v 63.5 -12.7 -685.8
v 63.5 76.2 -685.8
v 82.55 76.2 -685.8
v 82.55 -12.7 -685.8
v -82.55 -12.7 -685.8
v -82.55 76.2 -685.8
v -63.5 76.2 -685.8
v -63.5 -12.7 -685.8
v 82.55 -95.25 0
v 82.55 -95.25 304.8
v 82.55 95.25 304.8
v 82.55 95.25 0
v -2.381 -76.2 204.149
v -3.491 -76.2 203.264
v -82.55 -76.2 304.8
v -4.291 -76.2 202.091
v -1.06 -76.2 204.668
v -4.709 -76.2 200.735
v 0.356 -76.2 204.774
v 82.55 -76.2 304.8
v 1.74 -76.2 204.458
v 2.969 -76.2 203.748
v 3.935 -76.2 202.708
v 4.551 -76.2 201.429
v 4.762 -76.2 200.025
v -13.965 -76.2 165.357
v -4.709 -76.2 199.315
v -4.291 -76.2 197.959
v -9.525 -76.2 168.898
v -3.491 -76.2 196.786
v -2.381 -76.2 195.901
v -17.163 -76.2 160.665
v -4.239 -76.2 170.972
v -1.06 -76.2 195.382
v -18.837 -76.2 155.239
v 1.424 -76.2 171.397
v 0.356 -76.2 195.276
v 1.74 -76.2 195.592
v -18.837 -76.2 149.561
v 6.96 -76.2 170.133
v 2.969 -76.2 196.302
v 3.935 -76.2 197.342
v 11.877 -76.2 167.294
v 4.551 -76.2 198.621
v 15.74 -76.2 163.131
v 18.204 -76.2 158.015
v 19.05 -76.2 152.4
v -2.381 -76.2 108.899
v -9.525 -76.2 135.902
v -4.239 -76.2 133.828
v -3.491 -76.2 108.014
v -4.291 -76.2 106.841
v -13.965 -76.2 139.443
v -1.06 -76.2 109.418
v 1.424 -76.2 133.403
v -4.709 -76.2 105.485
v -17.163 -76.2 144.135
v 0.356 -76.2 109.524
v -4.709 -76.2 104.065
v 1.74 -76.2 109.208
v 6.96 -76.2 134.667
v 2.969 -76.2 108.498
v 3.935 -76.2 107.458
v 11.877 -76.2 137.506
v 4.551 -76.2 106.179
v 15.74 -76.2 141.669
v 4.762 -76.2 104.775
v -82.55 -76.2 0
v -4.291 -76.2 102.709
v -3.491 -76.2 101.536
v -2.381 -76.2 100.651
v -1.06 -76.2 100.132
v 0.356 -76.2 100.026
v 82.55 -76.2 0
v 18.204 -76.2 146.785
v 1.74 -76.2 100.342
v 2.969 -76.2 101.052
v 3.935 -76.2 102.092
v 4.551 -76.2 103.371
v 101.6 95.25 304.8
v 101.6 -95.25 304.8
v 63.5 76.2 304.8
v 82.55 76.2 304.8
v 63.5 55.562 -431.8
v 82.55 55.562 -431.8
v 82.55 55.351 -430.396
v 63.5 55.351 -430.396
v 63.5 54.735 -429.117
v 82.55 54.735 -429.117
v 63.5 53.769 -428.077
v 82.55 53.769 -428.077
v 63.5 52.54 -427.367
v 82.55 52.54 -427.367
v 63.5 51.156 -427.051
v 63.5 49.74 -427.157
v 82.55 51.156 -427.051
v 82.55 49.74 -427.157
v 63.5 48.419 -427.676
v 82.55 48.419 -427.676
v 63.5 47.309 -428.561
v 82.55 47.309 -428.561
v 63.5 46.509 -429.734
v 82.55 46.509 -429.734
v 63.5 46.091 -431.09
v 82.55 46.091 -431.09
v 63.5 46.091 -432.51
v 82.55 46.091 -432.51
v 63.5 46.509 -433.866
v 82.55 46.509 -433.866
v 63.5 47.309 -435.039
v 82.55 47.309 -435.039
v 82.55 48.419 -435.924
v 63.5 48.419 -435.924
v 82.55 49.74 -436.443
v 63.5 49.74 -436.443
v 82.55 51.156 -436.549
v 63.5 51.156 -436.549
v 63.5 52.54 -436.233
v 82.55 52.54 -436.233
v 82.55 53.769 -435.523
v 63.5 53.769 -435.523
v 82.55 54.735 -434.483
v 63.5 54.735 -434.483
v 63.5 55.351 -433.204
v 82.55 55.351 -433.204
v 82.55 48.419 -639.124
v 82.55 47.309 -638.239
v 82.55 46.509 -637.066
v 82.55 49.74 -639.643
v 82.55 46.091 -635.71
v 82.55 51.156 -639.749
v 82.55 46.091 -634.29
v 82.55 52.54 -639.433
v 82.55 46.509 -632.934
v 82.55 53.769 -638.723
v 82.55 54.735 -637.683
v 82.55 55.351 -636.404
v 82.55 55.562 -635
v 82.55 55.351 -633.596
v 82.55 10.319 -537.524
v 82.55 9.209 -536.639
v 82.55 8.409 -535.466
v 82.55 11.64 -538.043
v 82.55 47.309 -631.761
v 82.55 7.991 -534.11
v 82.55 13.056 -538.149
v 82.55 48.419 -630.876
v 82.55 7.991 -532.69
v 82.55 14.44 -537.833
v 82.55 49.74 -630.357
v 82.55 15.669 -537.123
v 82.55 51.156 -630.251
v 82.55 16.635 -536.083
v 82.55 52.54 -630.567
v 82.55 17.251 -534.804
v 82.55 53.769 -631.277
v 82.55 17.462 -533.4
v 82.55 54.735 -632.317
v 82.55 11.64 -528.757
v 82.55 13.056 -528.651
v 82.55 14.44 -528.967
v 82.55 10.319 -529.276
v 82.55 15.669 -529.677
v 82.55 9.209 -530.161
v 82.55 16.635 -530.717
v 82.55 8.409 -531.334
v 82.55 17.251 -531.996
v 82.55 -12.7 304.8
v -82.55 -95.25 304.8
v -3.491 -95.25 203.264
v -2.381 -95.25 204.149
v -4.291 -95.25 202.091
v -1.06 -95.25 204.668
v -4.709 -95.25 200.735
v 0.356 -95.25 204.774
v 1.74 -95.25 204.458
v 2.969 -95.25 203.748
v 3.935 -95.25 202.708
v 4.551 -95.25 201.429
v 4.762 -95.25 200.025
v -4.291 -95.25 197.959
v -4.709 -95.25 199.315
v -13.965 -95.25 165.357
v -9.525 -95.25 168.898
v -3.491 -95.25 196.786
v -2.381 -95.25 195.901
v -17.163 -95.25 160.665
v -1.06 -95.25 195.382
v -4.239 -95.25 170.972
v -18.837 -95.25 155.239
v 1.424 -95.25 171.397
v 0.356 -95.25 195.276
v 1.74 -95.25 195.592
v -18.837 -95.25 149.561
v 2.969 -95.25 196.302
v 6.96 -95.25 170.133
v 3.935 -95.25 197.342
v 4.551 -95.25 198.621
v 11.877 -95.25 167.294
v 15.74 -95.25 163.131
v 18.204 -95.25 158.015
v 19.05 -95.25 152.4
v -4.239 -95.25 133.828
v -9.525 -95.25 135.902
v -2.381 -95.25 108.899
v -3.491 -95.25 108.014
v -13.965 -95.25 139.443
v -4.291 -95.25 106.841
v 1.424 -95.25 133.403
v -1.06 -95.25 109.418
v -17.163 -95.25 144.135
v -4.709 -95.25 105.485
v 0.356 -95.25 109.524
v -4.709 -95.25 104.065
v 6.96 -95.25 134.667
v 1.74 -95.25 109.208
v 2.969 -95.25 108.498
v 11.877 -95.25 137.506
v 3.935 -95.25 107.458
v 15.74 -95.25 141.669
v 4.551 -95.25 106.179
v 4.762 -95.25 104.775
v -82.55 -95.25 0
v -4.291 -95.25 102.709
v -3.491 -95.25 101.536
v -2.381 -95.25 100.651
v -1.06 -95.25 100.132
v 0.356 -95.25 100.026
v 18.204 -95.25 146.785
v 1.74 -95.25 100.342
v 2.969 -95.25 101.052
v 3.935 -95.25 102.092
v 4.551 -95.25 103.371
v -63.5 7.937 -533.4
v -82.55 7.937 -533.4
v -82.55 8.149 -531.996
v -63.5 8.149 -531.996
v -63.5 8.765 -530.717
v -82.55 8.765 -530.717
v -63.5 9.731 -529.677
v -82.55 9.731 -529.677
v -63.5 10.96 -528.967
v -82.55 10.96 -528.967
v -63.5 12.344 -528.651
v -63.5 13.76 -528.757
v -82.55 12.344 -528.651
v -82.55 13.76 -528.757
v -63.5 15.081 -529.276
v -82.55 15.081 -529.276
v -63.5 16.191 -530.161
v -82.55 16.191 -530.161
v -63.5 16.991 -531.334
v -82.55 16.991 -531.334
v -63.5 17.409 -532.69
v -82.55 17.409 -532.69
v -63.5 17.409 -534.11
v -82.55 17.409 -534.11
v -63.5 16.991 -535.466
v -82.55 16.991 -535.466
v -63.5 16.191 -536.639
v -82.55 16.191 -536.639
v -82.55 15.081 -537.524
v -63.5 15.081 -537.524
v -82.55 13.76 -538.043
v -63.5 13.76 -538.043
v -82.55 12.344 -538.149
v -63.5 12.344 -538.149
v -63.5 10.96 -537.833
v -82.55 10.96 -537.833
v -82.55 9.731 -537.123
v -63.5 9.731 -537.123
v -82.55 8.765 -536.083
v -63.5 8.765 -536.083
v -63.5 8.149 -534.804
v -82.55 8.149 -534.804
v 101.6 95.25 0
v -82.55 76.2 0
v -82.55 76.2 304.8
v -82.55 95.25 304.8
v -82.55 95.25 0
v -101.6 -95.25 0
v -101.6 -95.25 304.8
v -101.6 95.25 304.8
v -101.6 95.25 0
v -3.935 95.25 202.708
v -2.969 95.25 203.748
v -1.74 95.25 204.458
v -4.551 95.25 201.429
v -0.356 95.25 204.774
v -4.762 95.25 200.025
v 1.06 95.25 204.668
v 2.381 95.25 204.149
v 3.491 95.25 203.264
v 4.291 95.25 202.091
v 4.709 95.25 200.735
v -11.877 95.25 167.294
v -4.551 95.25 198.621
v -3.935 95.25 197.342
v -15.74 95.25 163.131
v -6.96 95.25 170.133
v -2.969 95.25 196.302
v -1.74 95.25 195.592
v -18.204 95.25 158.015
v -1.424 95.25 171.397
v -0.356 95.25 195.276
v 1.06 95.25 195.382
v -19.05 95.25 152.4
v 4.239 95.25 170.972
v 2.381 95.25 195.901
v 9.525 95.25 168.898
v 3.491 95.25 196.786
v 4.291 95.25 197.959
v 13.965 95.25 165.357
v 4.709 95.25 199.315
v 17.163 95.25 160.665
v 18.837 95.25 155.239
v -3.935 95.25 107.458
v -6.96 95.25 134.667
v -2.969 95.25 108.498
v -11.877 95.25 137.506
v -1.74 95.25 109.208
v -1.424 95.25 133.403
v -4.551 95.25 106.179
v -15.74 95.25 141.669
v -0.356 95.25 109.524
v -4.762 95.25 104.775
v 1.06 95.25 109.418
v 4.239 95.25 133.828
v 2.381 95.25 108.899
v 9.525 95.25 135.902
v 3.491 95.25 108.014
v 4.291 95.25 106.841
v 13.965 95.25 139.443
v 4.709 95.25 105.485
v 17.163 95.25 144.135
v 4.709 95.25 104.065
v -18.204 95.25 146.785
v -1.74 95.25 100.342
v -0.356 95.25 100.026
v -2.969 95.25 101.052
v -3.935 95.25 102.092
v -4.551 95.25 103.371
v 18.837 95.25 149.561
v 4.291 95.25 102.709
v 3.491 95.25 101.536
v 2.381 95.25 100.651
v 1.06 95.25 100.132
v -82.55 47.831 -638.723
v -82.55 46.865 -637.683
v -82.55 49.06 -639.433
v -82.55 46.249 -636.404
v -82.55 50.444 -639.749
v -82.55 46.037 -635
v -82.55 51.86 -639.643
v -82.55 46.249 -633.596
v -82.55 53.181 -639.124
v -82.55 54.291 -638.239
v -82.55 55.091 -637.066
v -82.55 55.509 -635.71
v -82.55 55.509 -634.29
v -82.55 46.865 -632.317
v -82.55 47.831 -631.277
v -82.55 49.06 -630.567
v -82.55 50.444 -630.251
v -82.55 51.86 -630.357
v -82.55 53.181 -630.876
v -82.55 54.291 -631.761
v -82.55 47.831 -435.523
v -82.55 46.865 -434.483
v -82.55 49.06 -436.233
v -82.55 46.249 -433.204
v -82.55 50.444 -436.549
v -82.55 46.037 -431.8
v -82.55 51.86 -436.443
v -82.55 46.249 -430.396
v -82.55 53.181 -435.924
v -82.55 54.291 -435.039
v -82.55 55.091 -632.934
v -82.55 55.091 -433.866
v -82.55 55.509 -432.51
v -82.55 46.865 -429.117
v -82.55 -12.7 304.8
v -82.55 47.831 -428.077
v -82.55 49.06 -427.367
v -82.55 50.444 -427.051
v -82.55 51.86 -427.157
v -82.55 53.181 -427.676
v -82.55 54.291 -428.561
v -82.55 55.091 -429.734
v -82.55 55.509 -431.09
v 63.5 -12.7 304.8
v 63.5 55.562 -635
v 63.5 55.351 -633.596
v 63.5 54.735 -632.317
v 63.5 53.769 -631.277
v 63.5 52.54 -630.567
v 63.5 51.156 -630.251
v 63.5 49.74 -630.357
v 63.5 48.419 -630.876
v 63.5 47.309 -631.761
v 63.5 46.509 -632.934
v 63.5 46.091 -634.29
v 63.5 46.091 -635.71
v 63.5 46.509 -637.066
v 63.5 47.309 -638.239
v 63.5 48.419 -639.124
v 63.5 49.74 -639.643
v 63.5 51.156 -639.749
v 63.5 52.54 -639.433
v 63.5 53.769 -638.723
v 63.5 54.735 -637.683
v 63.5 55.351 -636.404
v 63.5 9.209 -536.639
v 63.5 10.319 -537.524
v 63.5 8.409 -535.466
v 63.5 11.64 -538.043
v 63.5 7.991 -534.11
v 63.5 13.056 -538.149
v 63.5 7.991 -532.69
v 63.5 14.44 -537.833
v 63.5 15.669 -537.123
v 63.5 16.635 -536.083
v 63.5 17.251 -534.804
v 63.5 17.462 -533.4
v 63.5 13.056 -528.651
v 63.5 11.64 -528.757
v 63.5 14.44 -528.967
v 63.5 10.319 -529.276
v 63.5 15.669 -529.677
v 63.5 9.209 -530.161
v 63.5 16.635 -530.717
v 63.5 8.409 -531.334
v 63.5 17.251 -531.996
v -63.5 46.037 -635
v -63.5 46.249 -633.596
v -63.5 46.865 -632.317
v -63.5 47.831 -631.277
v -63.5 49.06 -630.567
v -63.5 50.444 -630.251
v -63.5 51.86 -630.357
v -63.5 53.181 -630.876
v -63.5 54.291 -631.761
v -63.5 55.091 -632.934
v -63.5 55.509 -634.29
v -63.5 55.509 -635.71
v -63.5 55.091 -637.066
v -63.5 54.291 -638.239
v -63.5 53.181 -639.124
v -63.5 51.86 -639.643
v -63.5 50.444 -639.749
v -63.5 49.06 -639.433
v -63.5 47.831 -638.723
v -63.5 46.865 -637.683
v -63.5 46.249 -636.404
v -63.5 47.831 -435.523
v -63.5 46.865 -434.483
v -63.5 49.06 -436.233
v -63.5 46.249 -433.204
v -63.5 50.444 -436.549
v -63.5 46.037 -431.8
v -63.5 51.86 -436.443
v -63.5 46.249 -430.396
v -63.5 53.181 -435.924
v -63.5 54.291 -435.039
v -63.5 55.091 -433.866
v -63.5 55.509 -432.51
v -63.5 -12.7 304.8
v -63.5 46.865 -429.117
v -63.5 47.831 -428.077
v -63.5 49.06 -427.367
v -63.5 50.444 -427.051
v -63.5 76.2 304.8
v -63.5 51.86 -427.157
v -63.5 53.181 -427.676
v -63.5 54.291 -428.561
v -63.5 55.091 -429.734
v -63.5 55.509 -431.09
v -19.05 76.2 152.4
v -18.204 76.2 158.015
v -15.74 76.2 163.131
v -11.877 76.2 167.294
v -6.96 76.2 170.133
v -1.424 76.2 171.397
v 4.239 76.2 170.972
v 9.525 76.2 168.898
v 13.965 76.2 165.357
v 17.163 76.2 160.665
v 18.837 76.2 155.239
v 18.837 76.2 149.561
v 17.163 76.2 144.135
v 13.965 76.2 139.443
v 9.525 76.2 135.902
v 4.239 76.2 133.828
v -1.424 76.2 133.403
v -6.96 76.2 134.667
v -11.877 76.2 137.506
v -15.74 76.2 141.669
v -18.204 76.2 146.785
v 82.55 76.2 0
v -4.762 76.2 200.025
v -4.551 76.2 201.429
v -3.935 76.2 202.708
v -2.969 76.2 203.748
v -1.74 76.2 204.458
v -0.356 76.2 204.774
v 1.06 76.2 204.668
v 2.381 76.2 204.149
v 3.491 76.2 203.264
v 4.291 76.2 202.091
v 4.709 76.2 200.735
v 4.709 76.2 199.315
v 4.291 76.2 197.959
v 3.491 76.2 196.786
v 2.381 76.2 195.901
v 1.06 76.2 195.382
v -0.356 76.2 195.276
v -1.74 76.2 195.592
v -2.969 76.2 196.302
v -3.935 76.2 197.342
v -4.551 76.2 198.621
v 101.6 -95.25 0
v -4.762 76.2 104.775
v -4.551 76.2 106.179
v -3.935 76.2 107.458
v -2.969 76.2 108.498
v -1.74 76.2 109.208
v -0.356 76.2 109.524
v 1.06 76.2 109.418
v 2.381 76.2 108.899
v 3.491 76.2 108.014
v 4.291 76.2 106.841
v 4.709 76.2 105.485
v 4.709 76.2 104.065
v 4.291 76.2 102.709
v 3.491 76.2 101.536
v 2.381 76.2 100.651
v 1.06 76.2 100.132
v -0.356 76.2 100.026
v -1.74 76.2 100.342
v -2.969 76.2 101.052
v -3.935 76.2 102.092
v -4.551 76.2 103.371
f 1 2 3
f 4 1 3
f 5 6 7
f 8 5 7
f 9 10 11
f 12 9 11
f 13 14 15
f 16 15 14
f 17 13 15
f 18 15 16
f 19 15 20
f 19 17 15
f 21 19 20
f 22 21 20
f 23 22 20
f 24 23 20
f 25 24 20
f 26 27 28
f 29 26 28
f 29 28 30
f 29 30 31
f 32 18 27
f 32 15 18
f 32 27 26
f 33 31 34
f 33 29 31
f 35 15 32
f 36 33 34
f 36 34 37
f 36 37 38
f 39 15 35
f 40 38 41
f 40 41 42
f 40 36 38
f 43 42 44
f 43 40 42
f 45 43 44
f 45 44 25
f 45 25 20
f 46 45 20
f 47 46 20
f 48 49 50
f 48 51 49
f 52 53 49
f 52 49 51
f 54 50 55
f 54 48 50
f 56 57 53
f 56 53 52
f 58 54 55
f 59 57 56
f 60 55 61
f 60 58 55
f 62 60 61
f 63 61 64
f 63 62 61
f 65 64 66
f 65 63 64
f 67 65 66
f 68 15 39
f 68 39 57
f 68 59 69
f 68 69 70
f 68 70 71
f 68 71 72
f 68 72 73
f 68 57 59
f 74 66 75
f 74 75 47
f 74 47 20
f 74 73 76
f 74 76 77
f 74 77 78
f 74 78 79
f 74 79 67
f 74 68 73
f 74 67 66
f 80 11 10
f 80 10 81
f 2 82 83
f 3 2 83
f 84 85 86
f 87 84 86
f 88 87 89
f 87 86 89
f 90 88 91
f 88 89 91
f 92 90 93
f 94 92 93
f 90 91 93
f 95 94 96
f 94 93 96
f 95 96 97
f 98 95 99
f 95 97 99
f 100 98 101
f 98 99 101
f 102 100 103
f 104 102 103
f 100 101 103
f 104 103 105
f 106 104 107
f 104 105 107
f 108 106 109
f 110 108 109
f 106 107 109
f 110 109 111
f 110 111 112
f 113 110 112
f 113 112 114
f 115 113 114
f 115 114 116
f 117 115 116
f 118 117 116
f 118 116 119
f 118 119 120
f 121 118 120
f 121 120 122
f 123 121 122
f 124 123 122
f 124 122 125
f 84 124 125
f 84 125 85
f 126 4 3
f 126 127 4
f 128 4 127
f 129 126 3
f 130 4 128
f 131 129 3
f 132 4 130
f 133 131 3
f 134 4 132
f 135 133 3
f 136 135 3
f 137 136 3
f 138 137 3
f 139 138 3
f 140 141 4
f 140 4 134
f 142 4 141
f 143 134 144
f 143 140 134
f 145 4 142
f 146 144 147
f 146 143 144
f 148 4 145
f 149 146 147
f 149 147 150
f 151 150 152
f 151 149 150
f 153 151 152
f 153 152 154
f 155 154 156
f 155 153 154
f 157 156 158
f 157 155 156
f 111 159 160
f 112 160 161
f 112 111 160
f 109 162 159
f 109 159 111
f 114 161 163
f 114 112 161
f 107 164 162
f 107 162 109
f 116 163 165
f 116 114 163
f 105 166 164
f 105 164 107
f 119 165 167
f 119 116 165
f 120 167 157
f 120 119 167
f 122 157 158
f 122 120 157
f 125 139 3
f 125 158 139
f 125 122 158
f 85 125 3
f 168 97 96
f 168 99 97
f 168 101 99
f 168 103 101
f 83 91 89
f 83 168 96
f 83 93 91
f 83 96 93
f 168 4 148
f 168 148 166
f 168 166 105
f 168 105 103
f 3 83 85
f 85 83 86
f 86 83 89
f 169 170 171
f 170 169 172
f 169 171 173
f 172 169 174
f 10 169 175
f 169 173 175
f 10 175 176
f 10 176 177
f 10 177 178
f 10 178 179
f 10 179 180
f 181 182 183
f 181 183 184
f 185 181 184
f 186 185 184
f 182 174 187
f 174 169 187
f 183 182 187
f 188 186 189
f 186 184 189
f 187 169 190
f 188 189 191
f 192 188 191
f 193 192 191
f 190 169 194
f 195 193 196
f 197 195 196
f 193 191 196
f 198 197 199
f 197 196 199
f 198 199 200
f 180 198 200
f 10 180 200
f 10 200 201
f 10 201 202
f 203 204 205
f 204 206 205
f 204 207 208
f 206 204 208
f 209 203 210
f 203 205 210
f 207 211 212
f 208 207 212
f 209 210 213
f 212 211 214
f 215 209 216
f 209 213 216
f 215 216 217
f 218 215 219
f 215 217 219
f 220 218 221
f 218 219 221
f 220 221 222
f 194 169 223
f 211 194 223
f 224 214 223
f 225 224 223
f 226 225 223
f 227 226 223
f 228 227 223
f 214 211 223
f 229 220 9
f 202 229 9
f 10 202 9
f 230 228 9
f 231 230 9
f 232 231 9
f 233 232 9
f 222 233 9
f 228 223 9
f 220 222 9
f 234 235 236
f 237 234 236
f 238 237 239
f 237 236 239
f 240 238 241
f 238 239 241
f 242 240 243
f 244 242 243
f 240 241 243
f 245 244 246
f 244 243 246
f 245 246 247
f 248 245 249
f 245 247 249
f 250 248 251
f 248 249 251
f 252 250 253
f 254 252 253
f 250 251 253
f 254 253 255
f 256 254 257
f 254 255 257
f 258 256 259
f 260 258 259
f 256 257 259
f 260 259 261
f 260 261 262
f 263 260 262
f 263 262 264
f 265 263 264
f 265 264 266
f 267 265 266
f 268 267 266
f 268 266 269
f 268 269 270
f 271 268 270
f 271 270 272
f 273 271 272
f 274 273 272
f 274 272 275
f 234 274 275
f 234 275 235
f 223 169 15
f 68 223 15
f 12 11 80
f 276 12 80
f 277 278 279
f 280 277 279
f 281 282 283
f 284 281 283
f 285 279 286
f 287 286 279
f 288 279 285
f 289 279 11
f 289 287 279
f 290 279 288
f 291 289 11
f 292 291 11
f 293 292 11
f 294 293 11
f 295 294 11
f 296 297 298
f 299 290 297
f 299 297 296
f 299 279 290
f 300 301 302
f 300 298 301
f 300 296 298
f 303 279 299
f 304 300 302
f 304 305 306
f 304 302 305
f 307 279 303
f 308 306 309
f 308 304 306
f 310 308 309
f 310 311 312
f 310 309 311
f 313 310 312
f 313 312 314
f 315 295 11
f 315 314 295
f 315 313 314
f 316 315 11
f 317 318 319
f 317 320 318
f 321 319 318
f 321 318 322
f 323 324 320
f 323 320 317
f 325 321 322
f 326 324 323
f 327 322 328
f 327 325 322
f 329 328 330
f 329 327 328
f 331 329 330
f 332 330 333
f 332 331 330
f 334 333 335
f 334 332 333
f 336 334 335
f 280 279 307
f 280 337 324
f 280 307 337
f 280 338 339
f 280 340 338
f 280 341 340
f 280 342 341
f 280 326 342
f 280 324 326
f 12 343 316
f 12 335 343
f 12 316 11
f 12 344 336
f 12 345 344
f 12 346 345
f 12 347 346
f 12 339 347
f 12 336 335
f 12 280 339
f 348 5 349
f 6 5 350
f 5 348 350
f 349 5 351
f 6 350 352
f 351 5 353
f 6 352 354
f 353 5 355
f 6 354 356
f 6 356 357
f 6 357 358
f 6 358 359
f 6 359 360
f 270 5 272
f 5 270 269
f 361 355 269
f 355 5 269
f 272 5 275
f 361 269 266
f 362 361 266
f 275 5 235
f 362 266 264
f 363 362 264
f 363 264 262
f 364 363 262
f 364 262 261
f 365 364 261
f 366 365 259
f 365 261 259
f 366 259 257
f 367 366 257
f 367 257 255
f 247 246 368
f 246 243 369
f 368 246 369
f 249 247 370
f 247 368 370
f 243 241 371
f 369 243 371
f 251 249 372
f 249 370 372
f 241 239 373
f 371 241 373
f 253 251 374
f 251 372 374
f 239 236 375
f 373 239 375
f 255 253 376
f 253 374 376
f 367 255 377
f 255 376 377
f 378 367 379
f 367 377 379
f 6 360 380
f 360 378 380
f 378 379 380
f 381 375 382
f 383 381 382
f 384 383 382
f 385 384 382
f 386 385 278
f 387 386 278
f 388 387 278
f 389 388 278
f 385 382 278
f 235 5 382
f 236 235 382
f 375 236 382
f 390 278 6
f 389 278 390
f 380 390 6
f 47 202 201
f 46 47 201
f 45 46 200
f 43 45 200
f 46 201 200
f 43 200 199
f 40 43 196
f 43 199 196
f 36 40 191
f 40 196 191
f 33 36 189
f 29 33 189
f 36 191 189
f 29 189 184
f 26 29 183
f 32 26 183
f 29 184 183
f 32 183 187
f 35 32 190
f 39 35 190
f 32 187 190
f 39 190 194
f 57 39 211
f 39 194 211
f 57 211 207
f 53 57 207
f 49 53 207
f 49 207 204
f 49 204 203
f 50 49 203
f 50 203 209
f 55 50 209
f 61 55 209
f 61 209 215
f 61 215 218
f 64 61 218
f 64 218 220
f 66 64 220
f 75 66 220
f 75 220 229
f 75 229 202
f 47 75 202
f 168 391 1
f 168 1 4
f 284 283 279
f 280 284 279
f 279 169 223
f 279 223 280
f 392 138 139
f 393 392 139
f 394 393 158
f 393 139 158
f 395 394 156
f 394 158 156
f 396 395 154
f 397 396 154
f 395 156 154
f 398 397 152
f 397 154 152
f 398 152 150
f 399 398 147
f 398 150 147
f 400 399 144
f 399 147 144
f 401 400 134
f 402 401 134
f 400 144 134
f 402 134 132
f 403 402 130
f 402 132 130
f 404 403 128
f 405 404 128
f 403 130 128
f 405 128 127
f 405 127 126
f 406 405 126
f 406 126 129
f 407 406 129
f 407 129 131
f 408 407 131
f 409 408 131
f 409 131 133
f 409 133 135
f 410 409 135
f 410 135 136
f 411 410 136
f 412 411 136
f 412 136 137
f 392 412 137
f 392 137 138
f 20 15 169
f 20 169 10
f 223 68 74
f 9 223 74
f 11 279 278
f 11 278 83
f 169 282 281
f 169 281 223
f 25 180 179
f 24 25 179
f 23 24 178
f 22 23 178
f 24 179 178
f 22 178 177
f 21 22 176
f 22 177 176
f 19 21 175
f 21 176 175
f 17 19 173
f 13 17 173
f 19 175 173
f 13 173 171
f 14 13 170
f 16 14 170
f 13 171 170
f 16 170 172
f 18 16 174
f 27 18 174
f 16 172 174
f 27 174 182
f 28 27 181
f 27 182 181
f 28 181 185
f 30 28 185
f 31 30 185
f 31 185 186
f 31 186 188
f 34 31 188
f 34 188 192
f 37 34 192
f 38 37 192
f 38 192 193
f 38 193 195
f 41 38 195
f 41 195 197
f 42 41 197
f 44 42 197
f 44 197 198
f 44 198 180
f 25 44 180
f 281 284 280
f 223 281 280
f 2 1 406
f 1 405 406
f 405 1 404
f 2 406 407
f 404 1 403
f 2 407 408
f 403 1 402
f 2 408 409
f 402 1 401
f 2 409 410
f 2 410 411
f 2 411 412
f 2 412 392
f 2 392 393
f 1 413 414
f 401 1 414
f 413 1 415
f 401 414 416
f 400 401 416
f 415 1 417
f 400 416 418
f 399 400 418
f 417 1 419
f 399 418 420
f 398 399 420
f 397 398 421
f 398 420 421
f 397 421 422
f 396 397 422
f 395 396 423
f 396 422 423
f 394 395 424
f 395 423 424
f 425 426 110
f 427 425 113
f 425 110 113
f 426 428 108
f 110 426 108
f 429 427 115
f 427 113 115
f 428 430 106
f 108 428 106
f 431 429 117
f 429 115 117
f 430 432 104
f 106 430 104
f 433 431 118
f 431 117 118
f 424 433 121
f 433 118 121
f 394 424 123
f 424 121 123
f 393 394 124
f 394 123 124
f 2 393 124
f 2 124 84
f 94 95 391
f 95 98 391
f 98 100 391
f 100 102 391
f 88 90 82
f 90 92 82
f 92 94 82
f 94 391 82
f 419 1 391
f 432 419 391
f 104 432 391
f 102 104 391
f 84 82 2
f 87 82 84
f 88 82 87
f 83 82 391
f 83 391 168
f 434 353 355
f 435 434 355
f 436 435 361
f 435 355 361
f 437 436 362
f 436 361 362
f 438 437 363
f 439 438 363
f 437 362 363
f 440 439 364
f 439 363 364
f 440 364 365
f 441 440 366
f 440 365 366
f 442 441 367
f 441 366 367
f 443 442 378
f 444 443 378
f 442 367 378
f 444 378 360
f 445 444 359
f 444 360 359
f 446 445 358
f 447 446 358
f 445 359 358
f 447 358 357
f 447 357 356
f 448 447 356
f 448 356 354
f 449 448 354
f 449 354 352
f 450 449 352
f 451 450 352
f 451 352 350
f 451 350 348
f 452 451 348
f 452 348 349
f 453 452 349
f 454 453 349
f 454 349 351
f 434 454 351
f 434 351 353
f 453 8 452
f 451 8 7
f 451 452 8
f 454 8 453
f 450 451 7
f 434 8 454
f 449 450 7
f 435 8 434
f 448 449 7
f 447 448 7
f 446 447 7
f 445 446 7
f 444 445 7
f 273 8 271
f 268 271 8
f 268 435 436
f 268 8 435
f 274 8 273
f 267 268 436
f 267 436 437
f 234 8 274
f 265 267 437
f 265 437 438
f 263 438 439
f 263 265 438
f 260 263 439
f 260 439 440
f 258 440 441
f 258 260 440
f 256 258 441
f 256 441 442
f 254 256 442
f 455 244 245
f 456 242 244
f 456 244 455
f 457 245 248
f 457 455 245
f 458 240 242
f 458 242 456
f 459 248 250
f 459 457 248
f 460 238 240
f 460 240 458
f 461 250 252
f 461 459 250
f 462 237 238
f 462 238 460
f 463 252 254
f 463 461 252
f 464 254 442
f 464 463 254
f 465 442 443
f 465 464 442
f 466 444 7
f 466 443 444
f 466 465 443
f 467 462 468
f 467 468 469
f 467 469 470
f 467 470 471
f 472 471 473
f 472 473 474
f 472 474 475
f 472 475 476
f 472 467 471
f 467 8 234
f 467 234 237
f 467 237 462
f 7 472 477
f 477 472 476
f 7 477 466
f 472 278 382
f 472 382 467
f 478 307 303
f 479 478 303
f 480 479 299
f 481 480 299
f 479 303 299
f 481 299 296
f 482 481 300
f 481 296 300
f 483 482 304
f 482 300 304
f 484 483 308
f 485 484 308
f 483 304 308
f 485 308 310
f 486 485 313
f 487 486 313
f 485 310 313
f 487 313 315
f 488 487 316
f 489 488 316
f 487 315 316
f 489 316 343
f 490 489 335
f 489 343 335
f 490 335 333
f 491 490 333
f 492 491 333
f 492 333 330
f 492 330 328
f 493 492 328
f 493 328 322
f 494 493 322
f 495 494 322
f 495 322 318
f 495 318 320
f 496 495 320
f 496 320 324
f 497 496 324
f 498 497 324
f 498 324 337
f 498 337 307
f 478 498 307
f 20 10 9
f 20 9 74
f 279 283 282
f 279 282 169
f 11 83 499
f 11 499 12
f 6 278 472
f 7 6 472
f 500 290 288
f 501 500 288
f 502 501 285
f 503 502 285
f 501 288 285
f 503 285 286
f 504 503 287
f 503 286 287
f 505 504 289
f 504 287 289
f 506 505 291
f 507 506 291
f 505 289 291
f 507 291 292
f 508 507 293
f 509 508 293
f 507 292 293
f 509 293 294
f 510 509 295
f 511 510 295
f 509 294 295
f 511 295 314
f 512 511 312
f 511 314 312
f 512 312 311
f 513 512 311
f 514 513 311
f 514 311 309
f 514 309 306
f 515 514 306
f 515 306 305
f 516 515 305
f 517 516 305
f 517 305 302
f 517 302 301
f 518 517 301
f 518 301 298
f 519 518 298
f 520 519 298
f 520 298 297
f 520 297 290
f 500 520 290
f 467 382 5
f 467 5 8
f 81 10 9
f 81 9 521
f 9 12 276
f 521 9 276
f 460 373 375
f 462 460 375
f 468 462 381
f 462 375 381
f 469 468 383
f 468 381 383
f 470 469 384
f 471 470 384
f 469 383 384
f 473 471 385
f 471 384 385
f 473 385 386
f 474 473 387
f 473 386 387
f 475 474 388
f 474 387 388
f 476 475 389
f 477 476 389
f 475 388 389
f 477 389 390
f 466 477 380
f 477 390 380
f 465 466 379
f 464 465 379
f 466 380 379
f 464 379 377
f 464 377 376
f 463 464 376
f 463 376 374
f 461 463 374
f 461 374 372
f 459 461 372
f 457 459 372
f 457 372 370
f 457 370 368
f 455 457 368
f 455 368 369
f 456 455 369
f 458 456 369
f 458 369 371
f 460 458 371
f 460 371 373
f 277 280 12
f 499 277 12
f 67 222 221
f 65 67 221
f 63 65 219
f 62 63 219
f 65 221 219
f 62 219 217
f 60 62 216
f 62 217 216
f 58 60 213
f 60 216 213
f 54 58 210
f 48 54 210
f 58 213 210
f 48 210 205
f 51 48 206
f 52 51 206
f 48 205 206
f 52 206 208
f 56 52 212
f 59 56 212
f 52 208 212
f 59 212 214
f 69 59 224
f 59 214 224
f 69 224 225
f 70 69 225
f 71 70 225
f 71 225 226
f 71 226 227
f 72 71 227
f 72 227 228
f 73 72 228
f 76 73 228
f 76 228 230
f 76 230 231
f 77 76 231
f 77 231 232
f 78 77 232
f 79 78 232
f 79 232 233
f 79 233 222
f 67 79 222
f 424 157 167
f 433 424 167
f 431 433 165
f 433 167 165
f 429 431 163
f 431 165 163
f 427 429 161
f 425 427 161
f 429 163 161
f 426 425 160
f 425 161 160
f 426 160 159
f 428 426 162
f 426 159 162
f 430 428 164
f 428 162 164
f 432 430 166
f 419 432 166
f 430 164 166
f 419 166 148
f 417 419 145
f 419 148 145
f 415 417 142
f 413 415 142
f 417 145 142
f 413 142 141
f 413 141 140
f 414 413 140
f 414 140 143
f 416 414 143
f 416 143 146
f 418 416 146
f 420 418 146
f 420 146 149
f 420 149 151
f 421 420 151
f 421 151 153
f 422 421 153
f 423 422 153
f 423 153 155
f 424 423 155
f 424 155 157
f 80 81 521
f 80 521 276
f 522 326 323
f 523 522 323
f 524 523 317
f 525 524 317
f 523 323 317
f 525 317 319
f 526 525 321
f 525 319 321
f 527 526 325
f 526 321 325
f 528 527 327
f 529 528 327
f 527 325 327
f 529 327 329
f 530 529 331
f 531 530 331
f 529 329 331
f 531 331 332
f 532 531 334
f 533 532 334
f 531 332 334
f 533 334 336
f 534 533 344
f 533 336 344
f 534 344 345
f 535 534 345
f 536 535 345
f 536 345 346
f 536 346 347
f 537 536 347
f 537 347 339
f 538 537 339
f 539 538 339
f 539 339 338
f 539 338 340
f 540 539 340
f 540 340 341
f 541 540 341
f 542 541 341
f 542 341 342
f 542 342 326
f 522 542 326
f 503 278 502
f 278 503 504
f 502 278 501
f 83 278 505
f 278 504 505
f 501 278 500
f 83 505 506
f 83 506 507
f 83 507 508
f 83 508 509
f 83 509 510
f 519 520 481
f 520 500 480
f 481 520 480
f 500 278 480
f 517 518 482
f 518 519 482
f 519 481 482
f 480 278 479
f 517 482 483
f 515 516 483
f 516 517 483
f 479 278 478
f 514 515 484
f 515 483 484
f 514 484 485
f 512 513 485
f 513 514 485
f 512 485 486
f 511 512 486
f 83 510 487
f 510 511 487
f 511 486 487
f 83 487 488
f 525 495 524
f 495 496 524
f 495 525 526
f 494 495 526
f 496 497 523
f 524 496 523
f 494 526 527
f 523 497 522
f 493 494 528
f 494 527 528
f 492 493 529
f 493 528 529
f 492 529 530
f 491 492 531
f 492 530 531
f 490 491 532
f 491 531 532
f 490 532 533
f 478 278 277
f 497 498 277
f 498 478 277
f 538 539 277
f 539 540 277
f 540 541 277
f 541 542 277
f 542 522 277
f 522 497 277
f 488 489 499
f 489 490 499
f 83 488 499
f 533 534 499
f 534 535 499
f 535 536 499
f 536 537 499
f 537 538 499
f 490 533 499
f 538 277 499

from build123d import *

# Parameters (mm, degrees)
F0_W      = 19.05
F0_H      = 190.5
F1_DEPTH  = 304.8
F2_W      = 165.1
F2_H      = 19.05
F3_DEPTH  = 304.8
F4_R      = 4.7625
F4_R_2    = 19.05
F5_DEPTH  = 25.4
F6_R      = 4.7625
F6_R_2    = 19.05
F7_DEPTH  = 25.4
F8_W      = 19.05
F8_H      = 88.9
F9_DEPTH  = 990.6
F10_R     = 4.7625
F11_DEPTH = 25.4
F12_R     = 4.7625
F13_DEPTH = 25.4


with BuildPart() as f1:
    # F0 (on Top) → F1 (new body)
    with BuildSketch(Plane.XY):
        with Locations((92.075, 0)):
            Rectangle(F0_W, F0_H)
        with Locations((-92.075, 0)):
            Rectangle(F0_W, F0_H)
    extrude(amount=F1_DEPTH)


with BuildPart() as f3:
    # F2 (on Top) → F3 (new body)
    with BuildSketch(Plane.XY):
        with Locations((0, -85.725)):
            Rectangle(F2_W, F2_H)
        with Locations((0, 85.725)):
            Rectangle(F2_W, F2_H)
    extrude(amount=F3_DEPTH)

    # F4 (on face) → F5 (cut)
    with BuildSketch(Plane(origin=(0, 95.25, 0), x_dir=(-1, 0, 0), z_dir=(0, 1, 0))):
        with Locations((0, 200.025)):
            Circle(F4_R)
        with Locations((0, 152.4)):
            Circle(F4_R_2)
        with Locations((0, 104.775)):
            Circle(F4_R)
    extrude(amount=-F5_DEPTH, mode=Mode.SUBTRACT)

    # F6 (on face) → F7 (cut)
    with BuildSketch(Plane.XZ.offset(95.25)):
        with Locations((0, 104.775)):
            Circle(F6_R)
        with Locations((0, 152.4)):
            Circle(F6_R_2)
        with Locations((0, 200.025)):
            Circle(F6_R)
    extrude(amount=-F7_DEPTH, mode=Mode.SUBTRACT)


with BuildPart() as f9:
    # F8 (on face) → F9 (new body)
    with BuildSketch(Plane.XY.offset(304.8)):
        with Locations((-73.025, 31.75)):
            Rectangle(F8_W, F8_H)
        with Locations((73.025, 31.75)):
            Rectangle(F8_W, F8_H)
    extrude(amount=-F9_DEPTH)

    # F10 (on face) → F11 (cut)
    with BuildSketch(Plane.YZ.offset(82.55)):
        with Locations((50.8, -635)):
            Circle(F10_R)
        with Locations((12.7, -533.4)):
            Circle(F10_R)
        with Locations((50.8, -431.8)):
            Circle(F10_R)
    extrude(amount=-F11_DEPTH, mode=Mode.SUBTRACT)

    # F12 (on face) → F13 (cut)
    with BuildSketch(Plane(origin=(-82.55, 0, 0), x_dir=(0, -1, 0), z_dir=(-1, 0, 0))):
        with Locations((-50.8, -431.8)):
            Circle(F12_R)
        with Locations((-50.8, -635)):
            Circle(F12_R)
        with Locations((-12.7, -533.4)):
            Circle(F12_R)
    extrude(amount=-F13_DEPTH, mode=Mode.SUBTRACT)


solid = Compound([f1.part, f3.part, f9.part])
